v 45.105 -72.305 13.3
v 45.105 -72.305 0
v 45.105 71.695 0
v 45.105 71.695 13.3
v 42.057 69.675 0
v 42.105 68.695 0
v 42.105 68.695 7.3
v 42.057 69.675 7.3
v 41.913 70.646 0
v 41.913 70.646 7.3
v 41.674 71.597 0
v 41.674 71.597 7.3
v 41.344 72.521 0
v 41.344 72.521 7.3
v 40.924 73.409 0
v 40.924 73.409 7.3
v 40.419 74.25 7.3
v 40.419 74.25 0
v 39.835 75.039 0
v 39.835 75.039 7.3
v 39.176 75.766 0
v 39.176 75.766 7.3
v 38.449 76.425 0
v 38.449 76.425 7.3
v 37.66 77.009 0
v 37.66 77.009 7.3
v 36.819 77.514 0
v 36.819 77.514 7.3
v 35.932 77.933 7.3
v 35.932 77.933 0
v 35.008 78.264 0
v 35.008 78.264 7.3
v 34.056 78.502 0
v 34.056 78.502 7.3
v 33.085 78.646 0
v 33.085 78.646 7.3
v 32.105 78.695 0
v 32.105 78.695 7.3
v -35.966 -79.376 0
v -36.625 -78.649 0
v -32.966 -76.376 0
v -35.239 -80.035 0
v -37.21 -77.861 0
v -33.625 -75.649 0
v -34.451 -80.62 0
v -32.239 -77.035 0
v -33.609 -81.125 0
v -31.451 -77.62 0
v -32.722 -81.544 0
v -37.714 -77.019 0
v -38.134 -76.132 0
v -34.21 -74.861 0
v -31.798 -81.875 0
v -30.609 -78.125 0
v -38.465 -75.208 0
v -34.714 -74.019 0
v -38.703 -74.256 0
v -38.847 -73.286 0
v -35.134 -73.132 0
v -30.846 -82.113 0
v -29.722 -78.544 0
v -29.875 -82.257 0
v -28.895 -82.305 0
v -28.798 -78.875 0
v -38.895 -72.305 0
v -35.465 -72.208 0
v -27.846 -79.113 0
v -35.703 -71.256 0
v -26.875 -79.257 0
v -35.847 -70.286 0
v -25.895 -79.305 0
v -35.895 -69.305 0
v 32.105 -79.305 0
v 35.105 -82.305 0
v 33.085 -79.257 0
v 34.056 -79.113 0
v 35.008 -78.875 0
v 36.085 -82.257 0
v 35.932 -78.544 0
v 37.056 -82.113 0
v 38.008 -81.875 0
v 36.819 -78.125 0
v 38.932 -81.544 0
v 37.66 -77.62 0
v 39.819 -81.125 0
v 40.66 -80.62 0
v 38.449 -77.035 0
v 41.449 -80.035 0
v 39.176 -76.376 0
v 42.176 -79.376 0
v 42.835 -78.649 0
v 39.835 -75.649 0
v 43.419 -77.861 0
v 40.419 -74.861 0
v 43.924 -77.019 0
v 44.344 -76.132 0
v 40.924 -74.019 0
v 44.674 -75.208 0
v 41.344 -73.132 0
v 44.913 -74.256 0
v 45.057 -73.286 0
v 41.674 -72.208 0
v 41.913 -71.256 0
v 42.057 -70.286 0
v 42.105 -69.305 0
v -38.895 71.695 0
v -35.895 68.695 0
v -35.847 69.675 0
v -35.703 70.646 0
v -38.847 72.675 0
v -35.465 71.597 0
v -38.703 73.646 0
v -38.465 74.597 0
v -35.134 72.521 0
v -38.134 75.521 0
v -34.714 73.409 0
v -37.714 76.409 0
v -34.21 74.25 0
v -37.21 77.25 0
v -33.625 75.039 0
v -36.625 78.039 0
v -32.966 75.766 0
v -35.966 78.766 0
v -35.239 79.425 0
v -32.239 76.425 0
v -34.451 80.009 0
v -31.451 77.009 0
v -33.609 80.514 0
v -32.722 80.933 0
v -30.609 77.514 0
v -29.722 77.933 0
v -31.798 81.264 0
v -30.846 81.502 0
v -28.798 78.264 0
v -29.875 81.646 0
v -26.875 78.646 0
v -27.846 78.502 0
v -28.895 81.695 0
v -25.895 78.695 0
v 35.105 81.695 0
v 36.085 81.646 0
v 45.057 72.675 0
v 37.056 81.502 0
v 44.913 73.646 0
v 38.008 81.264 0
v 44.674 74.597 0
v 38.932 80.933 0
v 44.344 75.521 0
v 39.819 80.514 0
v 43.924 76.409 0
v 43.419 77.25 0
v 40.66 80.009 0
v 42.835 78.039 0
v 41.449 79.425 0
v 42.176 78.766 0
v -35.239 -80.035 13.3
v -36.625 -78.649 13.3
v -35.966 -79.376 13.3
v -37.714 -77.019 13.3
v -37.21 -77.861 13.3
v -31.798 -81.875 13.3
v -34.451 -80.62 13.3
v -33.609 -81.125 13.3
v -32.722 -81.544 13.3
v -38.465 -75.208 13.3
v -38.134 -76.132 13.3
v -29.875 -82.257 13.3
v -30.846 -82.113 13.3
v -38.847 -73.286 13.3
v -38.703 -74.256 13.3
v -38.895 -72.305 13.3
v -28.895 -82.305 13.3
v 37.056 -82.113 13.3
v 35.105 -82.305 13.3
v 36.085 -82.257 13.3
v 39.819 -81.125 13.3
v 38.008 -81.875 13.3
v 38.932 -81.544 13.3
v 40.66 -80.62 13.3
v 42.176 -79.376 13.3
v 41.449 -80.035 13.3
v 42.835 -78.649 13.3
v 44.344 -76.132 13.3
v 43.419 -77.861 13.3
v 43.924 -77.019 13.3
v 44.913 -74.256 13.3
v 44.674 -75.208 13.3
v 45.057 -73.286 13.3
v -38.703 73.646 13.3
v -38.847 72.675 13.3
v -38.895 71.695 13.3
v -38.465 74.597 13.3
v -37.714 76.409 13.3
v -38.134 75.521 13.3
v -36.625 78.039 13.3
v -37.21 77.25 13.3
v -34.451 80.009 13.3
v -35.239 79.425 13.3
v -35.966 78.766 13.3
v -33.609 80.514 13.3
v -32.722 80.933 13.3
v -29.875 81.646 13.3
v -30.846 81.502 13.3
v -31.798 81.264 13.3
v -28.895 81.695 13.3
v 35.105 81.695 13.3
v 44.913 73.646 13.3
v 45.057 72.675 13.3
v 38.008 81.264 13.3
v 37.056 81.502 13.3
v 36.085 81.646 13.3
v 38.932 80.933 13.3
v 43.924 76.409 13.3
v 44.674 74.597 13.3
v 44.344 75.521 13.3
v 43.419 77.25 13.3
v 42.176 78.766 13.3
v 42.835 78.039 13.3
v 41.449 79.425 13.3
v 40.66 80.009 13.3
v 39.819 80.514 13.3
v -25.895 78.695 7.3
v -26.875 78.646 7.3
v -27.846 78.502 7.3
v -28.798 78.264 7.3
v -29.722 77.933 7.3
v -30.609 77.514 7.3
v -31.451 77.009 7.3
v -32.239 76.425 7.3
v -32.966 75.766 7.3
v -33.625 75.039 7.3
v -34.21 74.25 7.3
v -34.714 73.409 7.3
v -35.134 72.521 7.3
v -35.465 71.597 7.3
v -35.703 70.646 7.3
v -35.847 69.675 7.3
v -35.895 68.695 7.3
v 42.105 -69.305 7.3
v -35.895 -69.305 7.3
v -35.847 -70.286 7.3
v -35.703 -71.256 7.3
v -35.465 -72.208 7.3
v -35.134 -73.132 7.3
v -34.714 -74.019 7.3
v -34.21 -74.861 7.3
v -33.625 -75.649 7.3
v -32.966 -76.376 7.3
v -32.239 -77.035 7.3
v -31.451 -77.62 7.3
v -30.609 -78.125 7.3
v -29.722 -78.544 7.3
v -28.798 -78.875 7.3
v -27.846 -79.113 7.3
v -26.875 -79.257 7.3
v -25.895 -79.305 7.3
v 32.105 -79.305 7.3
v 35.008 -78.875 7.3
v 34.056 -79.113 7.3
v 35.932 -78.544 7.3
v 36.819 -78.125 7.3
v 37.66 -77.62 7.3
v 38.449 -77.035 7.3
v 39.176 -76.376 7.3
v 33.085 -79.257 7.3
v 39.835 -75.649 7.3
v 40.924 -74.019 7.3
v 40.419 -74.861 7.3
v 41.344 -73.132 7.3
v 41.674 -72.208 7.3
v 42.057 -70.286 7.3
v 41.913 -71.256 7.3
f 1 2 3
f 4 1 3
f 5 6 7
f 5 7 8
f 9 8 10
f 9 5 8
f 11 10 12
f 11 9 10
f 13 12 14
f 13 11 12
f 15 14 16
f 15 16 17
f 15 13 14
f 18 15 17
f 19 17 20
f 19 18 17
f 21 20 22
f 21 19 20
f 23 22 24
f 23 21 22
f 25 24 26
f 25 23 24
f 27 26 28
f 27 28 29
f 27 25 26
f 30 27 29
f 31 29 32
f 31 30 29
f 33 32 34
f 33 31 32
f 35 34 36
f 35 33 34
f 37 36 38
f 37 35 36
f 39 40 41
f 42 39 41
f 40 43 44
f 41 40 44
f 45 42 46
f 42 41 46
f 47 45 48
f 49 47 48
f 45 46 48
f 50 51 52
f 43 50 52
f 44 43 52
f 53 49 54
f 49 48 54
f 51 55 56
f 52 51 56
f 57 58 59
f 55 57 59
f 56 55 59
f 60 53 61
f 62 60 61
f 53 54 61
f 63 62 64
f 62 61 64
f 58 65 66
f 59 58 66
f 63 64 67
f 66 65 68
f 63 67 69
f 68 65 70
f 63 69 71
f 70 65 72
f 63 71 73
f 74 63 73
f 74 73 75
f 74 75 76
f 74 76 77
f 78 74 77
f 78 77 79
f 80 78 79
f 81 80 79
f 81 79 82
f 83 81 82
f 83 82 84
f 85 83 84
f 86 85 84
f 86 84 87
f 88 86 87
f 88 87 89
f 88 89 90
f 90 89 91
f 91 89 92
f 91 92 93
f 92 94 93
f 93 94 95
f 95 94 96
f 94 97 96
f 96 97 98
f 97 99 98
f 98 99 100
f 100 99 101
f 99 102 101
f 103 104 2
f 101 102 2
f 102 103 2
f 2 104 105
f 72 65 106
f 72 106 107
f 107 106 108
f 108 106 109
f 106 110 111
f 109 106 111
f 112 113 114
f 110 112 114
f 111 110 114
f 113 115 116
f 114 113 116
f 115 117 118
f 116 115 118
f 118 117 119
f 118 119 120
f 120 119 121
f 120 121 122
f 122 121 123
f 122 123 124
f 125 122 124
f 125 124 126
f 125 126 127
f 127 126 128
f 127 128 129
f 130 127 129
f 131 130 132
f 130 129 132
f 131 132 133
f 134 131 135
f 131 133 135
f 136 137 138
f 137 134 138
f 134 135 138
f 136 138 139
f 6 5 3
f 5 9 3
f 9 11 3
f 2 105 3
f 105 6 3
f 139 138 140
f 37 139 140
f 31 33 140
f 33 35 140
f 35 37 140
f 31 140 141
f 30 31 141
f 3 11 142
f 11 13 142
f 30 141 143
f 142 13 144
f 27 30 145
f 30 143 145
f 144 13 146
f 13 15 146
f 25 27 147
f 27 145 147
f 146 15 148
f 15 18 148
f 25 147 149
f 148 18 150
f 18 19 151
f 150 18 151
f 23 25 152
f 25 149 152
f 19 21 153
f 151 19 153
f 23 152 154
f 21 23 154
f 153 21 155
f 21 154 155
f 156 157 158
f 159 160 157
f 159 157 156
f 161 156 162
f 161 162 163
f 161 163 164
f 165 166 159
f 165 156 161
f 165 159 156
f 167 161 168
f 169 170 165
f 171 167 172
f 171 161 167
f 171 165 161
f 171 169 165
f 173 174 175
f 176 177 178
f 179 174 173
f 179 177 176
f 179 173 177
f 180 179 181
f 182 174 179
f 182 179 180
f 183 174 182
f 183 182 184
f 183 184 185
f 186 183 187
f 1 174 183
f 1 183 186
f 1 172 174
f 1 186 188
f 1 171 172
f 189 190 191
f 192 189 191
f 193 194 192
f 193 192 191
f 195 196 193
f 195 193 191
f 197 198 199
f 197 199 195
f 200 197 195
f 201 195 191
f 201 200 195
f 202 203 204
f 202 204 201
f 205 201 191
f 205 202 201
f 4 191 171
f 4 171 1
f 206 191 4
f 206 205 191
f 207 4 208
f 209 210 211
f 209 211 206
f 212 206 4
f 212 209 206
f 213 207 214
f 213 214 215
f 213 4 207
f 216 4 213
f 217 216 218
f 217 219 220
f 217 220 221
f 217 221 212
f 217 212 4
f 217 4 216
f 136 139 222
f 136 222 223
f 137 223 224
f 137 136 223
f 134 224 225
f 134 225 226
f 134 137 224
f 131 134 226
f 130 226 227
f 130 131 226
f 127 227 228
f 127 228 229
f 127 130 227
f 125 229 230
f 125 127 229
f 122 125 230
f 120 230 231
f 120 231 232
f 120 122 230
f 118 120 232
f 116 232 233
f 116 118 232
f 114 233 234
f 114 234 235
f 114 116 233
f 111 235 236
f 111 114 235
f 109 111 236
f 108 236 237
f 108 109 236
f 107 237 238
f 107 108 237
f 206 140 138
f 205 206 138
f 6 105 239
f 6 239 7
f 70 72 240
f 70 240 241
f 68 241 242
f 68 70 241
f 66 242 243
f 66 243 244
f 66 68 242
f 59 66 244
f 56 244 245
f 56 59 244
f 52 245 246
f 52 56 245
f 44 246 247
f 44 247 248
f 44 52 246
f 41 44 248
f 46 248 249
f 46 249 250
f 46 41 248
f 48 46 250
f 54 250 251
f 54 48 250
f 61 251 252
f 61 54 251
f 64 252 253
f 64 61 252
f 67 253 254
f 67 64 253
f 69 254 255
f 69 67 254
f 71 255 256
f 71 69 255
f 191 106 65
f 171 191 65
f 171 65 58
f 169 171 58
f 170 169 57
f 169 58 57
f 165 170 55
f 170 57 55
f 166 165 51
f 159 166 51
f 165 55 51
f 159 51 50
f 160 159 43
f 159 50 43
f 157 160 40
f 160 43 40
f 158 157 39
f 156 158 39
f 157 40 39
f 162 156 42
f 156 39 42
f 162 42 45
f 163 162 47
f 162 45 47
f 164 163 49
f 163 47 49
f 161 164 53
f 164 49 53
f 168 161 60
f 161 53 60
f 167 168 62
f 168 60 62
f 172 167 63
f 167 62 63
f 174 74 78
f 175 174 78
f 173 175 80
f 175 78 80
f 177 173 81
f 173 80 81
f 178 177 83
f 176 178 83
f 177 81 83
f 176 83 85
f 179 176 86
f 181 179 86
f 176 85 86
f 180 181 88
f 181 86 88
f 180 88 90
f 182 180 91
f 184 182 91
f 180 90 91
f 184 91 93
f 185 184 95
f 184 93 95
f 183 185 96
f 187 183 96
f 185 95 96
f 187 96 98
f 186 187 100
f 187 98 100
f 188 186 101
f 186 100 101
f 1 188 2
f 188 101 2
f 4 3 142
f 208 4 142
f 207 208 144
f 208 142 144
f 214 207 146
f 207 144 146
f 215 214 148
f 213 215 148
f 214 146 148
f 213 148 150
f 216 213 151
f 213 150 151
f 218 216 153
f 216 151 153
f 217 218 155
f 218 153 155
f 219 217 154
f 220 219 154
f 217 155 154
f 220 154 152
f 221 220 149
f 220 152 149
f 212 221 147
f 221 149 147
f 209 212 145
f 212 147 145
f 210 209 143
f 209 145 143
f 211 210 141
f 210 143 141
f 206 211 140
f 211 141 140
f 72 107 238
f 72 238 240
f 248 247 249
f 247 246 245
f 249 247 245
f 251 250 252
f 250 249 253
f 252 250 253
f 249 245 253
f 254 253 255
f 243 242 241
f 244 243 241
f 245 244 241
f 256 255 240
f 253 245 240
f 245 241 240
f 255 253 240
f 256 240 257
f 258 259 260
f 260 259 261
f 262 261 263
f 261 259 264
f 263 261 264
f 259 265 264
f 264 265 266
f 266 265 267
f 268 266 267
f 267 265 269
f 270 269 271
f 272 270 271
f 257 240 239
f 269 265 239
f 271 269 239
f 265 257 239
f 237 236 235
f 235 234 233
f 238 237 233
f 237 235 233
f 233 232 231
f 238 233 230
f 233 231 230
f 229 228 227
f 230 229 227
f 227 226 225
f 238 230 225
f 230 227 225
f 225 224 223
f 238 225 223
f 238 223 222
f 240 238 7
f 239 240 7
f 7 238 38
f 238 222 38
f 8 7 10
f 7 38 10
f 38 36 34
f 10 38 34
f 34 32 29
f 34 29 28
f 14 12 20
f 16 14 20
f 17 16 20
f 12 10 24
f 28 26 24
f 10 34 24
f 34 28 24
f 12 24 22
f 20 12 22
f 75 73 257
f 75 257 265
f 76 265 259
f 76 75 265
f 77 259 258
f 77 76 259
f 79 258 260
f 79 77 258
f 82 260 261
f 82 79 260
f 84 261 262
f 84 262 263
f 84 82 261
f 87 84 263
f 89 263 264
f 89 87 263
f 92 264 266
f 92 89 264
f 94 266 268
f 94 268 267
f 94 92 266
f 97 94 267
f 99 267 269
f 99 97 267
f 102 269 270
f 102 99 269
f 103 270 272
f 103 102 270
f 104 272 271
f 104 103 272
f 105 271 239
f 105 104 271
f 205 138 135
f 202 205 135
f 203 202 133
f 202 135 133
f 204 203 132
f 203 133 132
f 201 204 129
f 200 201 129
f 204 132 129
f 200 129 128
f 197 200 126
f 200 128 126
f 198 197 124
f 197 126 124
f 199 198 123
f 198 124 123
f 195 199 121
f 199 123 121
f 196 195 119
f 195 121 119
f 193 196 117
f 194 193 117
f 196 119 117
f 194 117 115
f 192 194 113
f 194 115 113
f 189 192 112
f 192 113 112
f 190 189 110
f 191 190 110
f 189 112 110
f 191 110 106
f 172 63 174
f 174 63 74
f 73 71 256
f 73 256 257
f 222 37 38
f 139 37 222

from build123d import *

# Parameters (mm, degrees)
F1_DEPTH = 13.3
F3_DEPTH = 7.3


with BuildPart() as f1:
    # F0 (on Top) → F1 (new body)
    with BuildSketch(Plane.XY):
        with BuildLine():
            Line((35.104722, 81.694619), (-28.895278, 81.694619))
            ThreePointArc((-28.895278, 81.694619), (-35.966346, 78.765687), (-38.895278, 71.694619))
            Line((-38.895278, 71.694619), (-38.895278, -72.305381))
            ThreePointArc((-38.895278, -72.305381), (-35.966346, -79.376448), (-28.895278, -82.305381))
            Line((-28.895278, -82.305381), (35.104722, -82.305381))
            ThreePointArc((35.104722, -82.305381), (42.17579, -79.376448), (45.104722, -72.305381))
            Line((45.104722, -72.305381), (45.104722, 71.694619))
            ThreePointArc((45.104722, 71.694619), (42.17579, 78.765687), (35.104722, 81.694619))
        make_face()
    extrude(amount=F1_DEPTH)

    # F2 (on Top) → F3 (cut)
    with BuildSketch(Plane.XY):
        with BuildLine():
            Line((32.104722, 78.694619), (-25.895278, 78.694619))
            ThreePointArc((-25.895278, 78.694619), (-32.966346, 75.765687), (-35.895278, 68.694619))
            Line((-35.895278, 68.694619), (-35.895278, -69.305381))
            ThreePointArc((-35.895278, -69.305381), (-32.966346, -76.376448), (-25.895278, -79.305381))
            Line((-25.895278, -79.305381), (32.104722, -79.305381))
            ThreePointArc((32.104722, -79.305381), (39.17579, -76.376448), (42.104722, -69.305381))
            Line((42.104722, -69.305381), (42.104722, 68.694619))
            ThreePointArc((42.104722, 68.694619), (39.17579, 75.765687), (32.104722, 78.694619))
        make_face()
    extrude(amount=F3_DEPTH, mode=Mode.SUBTRACT)


solid = f1.part
